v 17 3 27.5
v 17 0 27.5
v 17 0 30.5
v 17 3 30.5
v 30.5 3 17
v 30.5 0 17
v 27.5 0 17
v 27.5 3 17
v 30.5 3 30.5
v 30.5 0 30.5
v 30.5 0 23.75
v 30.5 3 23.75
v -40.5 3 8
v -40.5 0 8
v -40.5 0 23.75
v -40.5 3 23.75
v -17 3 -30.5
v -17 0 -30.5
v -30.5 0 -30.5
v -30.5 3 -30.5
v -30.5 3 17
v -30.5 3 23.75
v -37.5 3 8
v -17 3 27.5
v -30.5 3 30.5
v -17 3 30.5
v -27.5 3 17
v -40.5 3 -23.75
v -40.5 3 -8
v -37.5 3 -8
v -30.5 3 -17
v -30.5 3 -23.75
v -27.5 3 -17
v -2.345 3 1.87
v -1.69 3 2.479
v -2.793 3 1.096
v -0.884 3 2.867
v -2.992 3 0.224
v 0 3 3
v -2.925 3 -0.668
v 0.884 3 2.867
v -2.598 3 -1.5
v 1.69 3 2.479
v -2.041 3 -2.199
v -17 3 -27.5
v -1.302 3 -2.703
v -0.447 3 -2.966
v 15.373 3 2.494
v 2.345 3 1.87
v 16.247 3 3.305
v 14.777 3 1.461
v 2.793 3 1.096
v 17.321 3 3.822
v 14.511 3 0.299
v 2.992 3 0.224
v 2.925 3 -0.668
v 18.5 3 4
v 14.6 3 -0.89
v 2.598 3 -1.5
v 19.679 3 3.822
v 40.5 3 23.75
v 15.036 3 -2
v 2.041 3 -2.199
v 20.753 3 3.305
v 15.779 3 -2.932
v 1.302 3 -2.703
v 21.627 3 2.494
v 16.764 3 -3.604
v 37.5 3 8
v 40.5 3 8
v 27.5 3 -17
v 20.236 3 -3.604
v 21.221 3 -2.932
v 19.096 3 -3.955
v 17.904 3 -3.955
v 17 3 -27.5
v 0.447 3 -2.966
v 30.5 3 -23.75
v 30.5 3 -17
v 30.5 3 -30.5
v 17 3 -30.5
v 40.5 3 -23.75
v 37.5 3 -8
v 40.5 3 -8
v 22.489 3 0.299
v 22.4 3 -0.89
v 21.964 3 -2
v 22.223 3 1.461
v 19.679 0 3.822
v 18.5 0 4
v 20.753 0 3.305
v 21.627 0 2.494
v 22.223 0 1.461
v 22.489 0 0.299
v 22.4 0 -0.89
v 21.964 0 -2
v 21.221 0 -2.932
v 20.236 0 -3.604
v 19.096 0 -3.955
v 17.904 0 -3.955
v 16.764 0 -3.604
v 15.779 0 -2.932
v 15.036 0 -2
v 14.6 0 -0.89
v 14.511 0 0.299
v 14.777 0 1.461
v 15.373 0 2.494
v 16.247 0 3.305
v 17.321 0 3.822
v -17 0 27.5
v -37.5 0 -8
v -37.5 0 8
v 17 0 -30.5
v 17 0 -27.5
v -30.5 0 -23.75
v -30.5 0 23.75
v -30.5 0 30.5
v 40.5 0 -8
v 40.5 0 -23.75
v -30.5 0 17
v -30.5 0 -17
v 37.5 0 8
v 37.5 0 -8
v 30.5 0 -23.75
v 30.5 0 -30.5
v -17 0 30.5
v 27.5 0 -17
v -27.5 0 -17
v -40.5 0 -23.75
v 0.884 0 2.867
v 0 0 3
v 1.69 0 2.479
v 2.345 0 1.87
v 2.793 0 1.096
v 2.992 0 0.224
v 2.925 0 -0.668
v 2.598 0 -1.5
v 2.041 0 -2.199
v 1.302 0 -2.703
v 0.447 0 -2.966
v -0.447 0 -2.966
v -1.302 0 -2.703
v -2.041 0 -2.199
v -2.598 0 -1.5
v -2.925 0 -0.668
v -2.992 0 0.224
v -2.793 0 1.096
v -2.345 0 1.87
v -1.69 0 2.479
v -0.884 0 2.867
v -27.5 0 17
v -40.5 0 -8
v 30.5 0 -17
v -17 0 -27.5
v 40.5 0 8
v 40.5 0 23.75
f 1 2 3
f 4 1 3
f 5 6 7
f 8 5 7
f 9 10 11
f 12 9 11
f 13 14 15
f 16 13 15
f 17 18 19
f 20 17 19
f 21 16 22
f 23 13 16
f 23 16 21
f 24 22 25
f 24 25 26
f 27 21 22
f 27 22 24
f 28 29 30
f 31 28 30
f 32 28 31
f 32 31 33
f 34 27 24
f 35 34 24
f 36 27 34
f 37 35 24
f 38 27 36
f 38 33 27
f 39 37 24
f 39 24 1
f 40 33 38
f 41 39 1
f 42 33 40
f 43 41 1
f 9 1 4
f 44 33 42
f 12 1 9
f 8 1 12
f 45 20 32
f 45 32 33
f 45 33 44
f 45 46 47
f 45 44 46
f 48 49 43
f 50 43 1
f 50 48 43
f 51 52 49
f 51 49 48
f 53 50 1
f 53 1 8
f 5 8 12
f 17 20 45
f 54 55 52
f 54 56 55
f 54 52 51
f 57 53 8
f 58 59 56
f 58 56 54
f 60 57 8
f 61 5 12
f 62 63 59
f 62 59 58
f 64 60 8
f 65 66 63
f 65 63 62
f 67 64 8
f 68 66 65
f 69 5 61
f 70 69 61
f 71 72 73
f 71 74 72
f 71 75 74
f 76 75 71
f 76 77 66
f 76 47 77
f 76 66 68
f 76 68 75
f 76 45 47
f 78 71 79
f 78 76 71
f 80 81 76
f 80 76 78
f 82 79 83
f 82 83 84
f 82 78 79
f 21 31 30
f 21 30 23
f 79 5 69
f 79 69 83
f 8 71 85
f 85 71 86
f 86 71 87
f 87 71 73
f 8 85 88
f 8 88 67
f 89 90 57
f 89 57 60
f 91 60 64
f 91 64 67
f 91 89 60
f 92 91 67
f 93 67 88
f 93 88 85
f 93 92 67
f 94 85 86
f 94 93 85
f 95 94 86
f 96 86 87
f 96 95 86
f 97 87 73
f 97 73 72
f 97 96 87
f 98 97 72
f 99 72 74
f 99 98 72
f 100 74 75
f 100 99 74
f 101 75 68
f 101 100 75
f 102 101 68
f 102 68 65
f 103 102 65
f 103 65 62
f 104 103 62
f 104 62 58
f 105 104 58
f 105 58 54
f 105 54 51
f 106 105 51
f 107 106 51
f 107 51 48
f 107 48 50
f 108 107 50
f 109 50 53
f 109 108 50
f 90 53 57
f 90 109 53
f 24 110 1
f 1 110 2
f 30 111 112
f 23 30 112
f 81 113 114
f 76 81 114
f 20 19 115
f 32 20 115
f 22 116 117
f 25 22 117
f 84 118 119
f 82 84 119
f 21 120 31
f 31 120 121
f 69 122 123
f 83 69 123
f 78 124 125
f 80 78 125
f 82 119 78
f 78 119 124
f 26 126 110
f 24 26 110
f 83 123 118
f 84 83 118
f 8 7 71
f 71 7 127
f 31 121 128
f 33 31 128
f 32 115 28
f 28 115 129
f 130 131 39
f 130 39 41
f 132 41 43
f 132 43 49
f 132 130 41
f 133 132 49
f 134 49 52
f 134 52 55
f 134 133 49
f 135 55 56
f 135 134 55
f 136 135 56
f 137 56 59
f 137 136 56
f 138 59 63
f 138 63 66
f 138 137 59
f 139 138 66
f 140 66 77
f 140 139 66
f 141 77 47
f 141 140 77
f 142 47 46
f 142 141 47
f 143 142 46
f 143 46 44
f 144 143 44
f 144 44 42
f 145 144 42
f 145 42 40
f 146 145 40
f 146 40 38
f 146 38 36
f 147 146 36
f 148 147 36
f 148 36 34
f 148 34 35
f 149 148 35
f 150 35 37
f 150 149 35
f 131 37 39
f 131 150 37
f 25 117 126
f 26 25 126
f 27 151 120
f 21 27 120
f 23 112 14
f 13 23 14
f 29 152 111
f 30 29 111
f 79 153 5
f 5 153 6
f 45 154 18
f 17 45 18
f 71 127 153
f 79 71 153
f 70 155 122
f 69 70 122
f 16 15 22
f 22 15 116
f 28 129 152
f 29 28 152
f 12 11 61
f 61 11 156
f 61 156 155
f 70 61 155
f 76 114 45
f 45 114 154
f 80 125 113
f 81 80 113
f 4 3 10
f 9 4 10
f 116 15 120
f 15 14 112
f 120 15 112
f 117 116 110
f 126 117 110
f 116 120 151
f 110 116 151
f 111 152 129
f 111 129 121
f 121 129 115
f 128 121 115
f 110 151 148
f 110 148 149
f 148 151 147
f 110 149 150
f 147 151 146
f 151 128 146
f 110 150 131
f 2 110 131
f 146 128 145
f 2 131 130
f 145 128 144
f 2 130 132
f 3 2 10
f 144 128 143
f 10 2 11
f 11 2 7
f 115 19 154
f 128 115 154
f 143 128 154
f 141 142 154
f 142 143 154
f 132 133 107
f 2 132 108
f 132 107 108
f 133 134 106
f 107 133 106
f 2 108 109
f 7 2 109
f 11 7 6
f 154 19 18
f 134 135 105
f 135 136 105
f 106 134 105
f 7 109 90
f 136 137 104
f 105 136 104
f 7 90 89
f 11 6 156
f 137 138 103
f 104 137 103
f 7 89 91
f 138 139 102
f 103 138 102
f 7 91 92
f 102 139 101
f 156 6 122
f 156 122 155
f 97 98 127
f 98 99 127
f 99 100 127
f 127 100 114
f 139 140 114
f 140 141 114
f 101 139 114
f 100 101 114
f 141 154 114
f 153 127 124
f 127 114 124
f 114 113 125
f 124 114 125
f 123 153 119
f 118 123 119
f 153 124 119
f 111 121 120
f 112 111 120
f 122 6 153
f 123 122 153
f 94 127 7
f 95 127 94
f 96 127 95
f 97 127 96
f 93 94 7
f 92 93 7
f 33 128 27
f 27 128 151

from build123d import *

# Parameters (mm, degrees)
CROQUIS1_R              = 3
CROQUIS1_R_2            = 4
SALIENTE_EXTRUIR1_DEPTH = 3


with BuildPart() as part:
    # Croquis1 → Saliente-Extruir1 (new body)
    with BuildSketch(Plane(origin=(0, 0, 0), x_dir=(1, 0, 0), z_dir=(0, 1, 0))):
        Polygon((17, 27.5), (0, 27.5), (-17, 27.5), (-17, 30.5), (-23.75, 30.5), (-30.5, 30.5), (-30.5, 23.75), (-40.5, 23.75), (-40.5, 8), (-37.5, 8), (-37.5, 0), (-37.5, -8), (-40.5, -8), (-40.5, -23.75), (-30.5, -23.75), (-30.5, -30.5), (-23.75, -30.5), (-17, -30.5), (-17, -27.5), (0, -27.5), (17, -27.5), (17, -30.5), (23.75, -30.5), (30.5, -30.5), (30.5, -23.75), (40.5, -23.75), (40.5, -8), (37.5, -8), (37.5, 0), (37.5, 8), (40.5, 8), (40.5, 23.75), (30.5, 23.75), (30.5, 30.5), (23.75, 30.5), (17, 30.5), align=None)
        Polygon((30.5, 17), (30.5, -17), (27.5, -17), (27.5, 0), (27.5, 17), align=None, mode=Mode.SUBTRACT)
        Polygon((-27.5, 17), (-27.5, 0), (-27.5, -17), (-30.5, -17), (-30.5, 17), align=None, mode=Mode.SUBTRACT)
        with Locations(Location((0, 0, 0), (0, 0, 270))):
            Circle(CROQUIS1_R, mode=Mode.SUBTRACT)
        with Locations(Location((18.5, 0, 0), (0, 0, 270))):
            Circle(CROQUIS1_R_2, mode=Mode.SUBTRACT)
    extrude(amount=SALIENTE_EXTRUIR1_DEPTH)


solid = part.part
